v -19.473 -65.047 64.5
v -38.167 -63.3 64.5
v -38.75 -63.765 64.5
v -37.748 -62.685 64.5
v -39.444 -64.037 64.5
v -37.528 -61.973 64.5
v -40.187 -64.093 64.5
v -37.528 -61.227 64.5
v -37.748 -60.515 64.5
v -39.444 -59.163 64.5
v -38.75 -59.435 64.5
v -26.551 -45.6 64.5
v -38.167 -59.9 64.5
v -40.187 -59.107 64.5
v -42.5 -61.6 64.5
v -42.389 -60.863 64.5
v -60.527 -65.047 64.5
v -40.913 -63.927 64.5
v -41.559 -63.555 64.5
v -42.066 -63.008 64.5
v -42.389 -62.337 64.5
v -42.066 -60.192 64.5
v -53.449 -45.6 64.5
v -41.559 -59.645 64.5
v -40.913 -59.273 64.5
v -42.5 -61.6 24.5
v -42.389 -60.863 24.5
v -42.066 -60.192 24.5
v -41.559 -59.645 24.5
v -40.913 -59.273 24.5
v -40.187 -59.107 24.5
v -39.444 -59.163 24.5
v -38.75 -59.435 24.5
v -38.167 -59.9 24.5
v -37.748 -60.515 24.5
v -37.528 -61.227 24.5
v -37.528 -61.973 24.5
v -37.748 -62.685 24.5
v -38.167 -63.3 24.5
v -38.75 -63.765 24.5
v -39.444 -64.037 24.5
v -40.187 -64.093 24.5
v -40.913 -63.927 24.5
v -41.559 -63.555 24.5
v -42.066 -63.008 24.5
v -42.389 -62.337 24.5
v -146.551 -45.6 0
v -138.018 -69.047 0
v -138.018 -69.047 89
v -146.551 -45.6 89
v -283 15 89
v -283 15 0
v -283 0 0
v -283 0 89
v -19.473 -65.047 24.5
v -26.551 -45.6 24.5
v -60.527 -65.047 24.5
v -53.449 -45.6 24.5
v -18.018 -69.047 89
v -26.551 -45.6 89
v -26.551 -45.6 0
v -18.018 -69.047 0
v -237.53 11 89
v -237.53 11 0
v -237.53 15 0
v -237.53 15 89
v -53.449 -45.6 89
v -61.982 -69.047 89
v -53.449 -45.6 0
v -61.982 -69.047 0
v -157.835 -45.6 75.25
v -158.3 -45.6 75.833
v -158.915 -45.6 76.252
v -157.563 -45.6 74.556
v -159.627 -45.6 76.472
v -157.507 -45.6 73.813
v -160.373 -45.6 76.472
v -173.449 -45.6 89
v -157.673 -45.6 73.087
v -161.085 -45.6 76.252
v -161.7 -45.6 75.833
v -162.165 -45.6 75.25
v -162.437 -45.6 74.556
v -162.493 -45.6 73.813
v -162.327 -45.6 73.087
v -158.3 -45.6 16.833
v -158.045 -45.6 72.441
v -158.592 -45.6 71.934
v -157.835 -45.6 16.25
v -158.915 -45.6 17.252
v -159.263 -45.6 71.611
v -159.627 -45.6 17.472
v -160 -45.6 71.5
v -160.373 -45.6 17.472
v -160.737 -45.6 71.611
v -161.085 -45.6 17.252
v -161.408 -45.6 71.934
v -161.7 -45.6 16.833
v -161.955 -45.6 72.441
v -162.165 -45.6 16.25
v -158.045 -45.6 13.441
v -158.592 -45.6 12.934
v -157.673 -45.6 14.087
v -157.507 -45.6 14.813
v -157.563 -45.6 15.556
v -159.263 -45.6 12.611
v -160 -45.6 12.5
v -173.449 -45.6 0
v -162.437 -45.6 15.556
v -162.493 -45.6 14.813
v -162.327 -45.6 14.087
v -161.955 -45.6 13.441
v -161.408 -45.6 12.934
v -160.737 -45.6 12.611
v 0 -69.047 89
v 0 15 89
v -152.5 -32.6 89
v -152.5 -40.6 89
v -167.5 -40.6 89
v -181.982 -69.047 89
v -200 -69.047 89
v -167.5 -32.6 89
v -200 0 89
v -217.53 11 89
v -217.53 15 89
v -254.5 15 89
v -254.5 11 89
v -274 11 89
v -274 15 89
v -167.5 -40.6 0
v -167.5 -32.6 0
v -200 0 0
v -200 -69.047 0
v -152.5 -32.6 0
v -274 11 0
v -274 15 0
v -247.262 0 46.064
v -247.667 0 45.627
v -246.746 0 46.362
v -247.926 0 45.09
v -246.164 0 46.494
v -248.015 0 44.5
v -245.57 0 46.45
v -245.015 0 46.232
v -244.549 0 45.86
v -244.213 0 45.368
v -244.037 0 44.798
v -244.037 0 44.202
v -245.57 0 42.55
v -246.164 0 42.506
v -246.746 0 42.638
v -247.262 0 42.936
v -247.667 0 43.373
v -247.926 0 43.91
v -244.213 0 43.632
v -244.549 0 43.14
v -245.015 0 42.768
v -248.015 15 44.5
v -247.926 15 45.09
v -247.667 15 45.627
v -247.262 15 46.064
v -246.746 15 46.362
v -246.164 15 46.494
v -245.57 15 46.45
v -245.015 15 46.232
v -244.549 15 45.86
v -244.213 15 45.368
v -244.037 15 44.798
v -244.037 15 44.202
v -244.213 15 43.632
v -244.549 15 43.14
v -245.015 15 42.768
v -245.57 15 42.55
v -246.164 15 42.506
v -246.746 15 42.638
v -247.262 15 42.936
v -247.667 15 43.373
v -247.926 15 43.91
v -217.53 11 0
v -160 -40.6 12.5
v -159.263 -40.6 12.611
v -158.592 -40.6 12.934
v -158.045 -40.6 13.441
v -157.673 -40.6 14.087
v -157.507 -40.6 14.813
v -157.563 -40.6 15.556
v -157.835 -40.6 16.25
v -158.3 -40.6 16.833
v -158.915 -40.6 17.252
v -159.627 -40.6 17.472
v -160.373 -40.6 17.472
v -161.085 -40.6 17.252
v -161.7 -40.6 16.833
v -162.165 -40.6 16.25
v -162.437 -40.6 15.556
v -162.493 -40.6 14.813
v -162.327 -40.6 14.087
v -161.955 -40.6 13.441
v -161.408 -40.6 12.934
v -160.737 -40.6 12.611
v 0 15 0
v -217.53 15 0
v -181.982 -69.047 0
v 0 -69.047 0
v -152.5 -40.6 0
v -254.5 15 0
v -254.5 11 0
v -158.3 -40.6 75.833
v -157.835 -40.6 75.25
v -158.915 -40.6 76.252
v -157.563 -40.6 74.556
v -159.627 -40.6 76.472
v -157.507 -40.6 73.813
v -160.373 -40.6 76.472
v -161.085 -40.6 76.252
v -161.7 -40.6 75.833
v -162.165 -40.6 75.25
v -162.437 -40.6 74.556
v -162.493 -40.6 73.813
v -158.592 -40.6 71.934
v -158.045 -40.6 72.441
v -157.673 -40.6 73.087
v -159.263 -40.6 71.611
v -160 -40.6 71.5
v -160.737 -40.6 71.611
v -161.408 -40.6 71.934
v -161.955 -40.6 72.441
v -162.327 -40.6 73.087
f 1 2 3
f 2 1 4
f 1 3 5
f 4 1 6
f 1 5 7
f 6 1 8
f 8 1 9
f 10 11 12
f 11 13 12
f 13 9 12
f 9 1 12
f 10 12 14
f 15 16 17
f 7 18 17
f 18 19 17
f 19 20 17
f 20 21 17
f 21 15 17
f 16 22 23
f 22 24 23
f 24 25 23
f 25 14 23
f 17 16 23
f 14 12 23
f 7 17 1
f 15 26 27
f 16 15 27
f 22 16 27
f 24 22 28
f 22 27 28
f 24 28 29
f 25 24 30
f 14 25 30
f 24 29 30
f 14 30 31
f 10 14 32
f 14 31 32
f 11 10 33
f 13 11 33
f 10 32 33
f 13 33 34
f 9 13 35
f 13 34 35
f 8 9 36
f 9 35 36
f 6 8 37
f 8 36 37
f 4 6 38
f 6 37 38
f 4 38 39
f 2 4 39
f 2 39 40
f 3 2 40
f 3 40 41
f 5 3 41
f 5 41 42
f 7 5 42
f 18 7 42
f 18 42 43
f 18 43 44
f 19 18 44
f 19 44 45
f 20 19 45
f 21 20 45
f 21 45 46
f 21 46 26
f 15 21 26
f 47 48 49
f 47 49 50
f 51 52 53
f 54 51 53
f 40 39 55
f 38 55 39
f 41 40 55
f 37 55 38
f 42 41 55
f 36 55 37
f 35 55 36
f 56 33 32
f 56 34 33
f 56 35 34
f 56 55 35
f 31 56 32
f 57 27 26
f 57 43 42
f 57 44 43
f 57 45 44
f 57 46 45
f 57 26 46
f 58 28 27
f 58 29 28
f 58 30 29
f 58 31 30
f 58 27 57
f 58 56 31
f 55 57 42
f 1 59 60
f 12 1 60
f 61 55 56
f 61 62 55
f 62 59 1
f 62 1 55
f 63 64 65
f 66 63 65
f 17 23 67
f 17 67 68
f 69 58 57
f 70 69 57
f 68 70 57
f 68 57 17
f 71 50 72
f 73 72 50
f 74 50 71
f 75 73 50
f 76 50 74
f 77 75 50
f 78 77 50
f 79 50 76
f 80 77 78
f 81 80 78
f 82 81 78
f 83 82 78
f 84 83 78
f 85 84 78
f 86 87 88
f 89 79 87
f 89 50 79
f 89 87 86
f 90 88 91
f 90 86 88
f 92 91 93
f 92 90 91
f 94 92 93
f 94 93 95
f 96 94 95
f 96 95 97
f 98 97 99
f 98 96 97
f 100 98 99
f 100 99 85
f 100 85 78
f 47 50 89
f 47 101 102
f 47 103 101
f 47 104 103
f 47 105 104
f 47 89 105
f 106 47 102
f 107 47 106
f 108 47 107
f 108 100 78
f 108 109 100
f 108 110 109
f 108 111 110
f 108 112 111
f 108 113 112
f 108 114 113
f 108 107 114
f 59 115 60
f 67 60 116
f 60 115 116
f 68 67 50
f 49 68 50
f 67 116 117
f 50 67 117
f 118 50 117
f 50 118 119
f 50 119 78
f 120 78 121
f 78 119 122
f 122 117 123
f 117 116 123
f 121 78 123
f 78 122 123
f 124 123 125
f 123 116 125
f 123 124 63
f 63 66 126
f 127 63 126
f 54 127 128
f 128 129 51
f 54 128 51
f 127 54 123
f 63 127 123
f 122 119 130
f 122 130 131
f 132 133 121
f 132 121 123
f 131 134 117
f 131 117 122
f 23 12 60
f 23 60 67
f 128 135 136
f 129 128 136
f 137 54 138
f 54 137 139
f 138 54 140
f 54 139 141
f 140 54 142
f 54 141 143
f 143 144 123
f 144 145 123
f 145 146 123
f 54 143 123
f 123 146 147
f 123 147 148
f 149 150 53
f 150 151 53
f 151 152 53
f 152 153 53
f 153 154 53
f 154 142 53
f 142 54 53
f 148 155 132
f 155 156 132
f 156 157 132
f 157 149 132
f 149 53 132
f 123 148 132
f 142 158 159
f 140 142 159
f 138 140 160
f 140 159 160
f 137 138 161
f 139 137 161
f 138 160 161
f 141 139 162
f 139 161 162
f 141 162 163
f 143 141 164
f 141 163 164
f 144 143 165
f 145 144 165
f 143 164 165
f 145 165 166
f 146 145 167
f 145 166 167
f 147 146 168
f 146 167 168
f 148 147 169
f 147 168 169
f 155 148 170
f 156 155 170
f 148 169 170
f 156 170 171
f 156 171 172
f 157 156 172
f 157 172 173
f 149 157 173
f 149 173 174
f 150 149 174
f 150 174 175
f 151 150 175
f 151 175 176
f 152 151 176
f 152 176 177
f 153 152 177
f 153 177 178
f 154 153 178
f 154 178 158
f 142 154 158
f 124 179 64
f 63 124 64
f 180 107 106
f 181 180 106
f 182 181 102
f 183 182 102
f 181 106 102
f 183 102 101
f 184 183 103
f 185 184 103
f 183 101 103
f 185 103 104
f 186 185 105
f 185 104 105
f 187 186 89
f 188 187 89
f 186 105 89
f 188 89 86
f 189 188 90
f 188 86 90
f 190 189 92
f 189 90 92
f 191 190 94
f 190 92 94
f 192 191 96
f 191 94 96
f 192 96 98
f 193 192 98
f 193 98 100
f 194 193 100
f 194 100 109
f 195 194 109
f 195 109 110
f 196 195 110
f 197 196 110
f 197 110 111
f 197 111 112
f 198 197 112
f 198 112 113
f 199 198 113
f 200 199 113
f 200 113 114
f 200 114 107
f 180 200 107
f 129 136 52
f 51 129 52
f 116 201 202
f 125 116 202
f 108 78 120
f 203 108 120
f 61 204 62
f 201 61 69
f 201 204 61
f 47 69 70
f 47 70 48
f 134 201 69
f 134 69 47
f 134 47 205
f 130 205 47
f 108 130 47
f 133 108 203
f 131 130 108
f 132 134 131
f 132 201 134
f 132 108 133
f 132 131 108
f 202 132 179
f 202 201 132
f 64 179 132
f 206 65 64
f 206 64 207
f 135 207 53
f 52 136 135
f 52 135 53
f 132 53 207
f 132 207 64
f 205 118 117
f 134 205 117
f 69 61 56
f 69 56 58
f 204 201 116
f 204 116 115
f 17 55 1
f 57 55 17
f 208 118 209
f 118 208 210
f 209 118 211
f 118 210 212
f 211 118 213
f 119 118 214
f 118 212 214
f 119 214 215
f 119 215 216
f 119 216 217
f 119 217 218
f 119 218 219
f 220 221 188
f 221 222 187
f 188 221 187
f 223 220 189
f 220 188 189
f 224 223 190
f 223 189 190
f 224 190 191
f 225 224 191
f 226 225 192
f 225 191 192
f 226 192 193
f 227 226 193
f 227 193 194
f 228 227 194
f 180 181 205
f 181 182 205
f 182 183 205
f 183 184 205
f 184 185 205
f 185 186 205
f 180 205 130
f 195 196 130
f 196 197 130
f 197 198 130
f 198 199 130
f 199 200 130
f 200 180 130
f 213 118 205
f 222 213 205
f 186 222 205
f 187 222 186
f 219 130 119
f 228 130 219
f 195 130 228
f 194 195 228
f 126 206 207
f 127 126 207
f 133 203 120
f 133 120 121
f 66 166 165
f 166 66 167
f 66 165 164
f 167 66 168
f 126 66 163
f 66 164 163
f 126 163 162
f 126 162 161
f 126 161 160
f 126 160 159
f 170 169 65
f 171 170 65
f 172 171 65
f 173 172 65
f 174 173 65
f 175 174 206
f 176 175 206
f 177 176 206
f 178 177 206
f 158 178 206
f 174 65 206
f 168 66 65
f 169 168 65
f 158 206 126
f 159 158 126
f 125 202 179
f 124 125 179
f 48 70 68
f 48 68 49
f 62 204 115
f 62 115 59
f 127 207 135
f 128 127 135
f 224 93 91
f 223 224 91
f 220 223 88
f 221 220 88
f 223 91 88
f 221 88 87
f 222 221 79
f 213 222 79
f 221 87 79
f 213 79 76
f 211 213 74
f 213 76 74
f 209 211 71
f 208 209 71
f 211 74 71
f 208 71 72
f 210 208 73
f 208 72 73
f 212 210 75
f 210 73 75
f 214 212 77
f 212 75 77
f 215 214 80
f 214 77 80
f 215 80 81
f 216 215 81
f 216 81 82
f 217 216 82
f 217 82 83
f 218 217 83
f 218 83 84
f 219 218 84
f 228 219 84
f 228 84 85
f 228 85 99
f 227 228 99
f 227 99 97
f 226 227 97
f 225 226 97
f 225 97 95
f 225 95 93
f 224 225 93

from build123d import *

# Parameters (mm, degrees)
BOSS_EXTRUDE1_DEPTH = 89
SKETCH2_R           = 2
CUT_EXTRUDE1_DEPTH  = 26
BOSS_EXTRUDE2_DEPTH = 89
SKETCH4_W           = 47.922407602
SKETCH4_H           = 26.699627092
BOSS_EXTRUDE3_DEPTH = 20
SKETCH7_R           = 2.5
CUT_EXTRUDE2_DEPTH  = 299.356682512
SKETCH9_W           = 15
SKETCH9_H           = 8
CUT_EXTRUDE3_DEPTH  = 305.5939264
CUT_EXTRUDE4_REACH  = 304.791
SKETCH8_R           = 2.5


with BuildPart() as part:
    # Sketch1 → Boss-Extrude1 (new body)
    with BuildSketch(Plane.XY):
        Polygon((-283, 0), (0, 0), (0, 15), (-217.53, 15), (-217.53, 11), (-237.53, 11), (-237.53, 15), (-254.5, 15), (-254.5, 11), (-274, 11), (-274, 15), (-283, 15), align=None)
    extrude(amount=BOSS_EXTRUDE1_DEPTH)

    # Sketch2 → Cut-Extrude1 (cut)
    with BuildSketch(Plane(origin=(0, 15, 0), x_dir=(1, 0, 0), z_dir=(0, 1, 0))):
        with Locations(Location((-246.015, -44.5, 0), (0, 0, 180))):
            Circle(SKETCH2_R)
    extrude(amount=-CUT_EXTRUDE1_DEPTH, mode=Mode.SUBTRACT)

    # Sketch3 → Boss-Extrude2 (add)
    with BuildSketch(Plane(origin=(0, 0, 0), x_dir=(-1, 0, 0), z_dir=(0, 0, -1))):
        Polygon((0, 0), (0, -61.6), (0, -69.046795722), (18.017528485, -69.046795722), (26.551464217, -45.6), (53.448535783, -45.6), (61.982471515, -69.046795722), (138.017528485, -69.046795722), (146.551464217, -45.6), (173.448535783, -45.6), (181.982471515, -69.046795722), (200, -69.046795722), (200, -61.6), (200, 7.5), (0, 7.5), align=None)
    extrude(amount=-BOSS_EXTRUDE2_DEPTH)

    # Sketch4 → Boss-Extrude3 (add, symmetric)
    with BuildSketch(Plane(origin=(0, 0, 44.5), x_dir=(-1, 0, 0), z_dir=(0, 0, -1))):
        with Locations((40.197751444, -51.696982176)):
            Rectangle(SKETCH4_W, SKETCH4_H)
    extrude(amount=BOSS_EXTRUDE3_DEPTH, both=True)

    # Sketch7 → Cut-Extrude2 (cut, through all)
    with BuildSketch(Plane(origin=(0, 0, 24.5), x_dir=(-1, 0, 0), z_dir=(0, 0, -1))):
        with Locations((40, -61.6)):
            Circle(SKETCH7_R)
    extrude(amount=-CUT_EXTRUDE2_DEPTH, mode=Mode.SUBTRACT)

    # Sketch9 → Cut-Extrude3 (cut, through all)
    with BuildSketch(Plane(origin=(0, 0, 0), x_dir=(-1, 0, 0), z_dir=(0, 0, -1))):
        with Locations((160, -36.6)):
            Rectangle(SKETCH9_W, SKETCH9_H)
    extrude(amount=-CUT_EXTRUDE3_DEPTH, mode=Mode.SUBTRACT)

    # Sketch8 → Cut-Extrude4 (cut, up to next)
    with BuildSketch(Plane.XZ.offset(45.6), mode=Mode.PRIVATE) as cut_extrude4_sk1:
        with Locations(Location((-160, 74, 0), (0, 0, 270))):
            Circle(SKETCH8_R)
    cut_extrude4_tool1 = extrude(cut_extrude4_sk1.sketch, amount=-CUT_EXTRUDE4_REACH, mode=Mode.PRIVATE) & part.part
    # Sketch8 → Cut-Extrude4 (cut, up to next)
    with BuildSketch(Plane.XZ.offset(45.6), mode=Mode.PRIVATE) as cut_extrude4_sk2:
        with Locations(Location((-160, 15, 0), (0, 0, 270))):
            Circle(SKETCH8_R)
    cut_extrude4_tool2 = extrude(cut_extrude4_sk2.sketch, amount=-CUT_EXTRUDE4_REACH, mode=Mode.PRIVATE) & part.part
    add(cut_extrude4_tool1.solids().sort_by_distance((-160, -45.6, 74))[0], mode=Mode.SUBTRACT)
    add(cut_extrude4_tool2.solids().sort_by_distance((-160, -45.6, 15))[0], mode=Mode.SUBTRACT)


solid = part.part
